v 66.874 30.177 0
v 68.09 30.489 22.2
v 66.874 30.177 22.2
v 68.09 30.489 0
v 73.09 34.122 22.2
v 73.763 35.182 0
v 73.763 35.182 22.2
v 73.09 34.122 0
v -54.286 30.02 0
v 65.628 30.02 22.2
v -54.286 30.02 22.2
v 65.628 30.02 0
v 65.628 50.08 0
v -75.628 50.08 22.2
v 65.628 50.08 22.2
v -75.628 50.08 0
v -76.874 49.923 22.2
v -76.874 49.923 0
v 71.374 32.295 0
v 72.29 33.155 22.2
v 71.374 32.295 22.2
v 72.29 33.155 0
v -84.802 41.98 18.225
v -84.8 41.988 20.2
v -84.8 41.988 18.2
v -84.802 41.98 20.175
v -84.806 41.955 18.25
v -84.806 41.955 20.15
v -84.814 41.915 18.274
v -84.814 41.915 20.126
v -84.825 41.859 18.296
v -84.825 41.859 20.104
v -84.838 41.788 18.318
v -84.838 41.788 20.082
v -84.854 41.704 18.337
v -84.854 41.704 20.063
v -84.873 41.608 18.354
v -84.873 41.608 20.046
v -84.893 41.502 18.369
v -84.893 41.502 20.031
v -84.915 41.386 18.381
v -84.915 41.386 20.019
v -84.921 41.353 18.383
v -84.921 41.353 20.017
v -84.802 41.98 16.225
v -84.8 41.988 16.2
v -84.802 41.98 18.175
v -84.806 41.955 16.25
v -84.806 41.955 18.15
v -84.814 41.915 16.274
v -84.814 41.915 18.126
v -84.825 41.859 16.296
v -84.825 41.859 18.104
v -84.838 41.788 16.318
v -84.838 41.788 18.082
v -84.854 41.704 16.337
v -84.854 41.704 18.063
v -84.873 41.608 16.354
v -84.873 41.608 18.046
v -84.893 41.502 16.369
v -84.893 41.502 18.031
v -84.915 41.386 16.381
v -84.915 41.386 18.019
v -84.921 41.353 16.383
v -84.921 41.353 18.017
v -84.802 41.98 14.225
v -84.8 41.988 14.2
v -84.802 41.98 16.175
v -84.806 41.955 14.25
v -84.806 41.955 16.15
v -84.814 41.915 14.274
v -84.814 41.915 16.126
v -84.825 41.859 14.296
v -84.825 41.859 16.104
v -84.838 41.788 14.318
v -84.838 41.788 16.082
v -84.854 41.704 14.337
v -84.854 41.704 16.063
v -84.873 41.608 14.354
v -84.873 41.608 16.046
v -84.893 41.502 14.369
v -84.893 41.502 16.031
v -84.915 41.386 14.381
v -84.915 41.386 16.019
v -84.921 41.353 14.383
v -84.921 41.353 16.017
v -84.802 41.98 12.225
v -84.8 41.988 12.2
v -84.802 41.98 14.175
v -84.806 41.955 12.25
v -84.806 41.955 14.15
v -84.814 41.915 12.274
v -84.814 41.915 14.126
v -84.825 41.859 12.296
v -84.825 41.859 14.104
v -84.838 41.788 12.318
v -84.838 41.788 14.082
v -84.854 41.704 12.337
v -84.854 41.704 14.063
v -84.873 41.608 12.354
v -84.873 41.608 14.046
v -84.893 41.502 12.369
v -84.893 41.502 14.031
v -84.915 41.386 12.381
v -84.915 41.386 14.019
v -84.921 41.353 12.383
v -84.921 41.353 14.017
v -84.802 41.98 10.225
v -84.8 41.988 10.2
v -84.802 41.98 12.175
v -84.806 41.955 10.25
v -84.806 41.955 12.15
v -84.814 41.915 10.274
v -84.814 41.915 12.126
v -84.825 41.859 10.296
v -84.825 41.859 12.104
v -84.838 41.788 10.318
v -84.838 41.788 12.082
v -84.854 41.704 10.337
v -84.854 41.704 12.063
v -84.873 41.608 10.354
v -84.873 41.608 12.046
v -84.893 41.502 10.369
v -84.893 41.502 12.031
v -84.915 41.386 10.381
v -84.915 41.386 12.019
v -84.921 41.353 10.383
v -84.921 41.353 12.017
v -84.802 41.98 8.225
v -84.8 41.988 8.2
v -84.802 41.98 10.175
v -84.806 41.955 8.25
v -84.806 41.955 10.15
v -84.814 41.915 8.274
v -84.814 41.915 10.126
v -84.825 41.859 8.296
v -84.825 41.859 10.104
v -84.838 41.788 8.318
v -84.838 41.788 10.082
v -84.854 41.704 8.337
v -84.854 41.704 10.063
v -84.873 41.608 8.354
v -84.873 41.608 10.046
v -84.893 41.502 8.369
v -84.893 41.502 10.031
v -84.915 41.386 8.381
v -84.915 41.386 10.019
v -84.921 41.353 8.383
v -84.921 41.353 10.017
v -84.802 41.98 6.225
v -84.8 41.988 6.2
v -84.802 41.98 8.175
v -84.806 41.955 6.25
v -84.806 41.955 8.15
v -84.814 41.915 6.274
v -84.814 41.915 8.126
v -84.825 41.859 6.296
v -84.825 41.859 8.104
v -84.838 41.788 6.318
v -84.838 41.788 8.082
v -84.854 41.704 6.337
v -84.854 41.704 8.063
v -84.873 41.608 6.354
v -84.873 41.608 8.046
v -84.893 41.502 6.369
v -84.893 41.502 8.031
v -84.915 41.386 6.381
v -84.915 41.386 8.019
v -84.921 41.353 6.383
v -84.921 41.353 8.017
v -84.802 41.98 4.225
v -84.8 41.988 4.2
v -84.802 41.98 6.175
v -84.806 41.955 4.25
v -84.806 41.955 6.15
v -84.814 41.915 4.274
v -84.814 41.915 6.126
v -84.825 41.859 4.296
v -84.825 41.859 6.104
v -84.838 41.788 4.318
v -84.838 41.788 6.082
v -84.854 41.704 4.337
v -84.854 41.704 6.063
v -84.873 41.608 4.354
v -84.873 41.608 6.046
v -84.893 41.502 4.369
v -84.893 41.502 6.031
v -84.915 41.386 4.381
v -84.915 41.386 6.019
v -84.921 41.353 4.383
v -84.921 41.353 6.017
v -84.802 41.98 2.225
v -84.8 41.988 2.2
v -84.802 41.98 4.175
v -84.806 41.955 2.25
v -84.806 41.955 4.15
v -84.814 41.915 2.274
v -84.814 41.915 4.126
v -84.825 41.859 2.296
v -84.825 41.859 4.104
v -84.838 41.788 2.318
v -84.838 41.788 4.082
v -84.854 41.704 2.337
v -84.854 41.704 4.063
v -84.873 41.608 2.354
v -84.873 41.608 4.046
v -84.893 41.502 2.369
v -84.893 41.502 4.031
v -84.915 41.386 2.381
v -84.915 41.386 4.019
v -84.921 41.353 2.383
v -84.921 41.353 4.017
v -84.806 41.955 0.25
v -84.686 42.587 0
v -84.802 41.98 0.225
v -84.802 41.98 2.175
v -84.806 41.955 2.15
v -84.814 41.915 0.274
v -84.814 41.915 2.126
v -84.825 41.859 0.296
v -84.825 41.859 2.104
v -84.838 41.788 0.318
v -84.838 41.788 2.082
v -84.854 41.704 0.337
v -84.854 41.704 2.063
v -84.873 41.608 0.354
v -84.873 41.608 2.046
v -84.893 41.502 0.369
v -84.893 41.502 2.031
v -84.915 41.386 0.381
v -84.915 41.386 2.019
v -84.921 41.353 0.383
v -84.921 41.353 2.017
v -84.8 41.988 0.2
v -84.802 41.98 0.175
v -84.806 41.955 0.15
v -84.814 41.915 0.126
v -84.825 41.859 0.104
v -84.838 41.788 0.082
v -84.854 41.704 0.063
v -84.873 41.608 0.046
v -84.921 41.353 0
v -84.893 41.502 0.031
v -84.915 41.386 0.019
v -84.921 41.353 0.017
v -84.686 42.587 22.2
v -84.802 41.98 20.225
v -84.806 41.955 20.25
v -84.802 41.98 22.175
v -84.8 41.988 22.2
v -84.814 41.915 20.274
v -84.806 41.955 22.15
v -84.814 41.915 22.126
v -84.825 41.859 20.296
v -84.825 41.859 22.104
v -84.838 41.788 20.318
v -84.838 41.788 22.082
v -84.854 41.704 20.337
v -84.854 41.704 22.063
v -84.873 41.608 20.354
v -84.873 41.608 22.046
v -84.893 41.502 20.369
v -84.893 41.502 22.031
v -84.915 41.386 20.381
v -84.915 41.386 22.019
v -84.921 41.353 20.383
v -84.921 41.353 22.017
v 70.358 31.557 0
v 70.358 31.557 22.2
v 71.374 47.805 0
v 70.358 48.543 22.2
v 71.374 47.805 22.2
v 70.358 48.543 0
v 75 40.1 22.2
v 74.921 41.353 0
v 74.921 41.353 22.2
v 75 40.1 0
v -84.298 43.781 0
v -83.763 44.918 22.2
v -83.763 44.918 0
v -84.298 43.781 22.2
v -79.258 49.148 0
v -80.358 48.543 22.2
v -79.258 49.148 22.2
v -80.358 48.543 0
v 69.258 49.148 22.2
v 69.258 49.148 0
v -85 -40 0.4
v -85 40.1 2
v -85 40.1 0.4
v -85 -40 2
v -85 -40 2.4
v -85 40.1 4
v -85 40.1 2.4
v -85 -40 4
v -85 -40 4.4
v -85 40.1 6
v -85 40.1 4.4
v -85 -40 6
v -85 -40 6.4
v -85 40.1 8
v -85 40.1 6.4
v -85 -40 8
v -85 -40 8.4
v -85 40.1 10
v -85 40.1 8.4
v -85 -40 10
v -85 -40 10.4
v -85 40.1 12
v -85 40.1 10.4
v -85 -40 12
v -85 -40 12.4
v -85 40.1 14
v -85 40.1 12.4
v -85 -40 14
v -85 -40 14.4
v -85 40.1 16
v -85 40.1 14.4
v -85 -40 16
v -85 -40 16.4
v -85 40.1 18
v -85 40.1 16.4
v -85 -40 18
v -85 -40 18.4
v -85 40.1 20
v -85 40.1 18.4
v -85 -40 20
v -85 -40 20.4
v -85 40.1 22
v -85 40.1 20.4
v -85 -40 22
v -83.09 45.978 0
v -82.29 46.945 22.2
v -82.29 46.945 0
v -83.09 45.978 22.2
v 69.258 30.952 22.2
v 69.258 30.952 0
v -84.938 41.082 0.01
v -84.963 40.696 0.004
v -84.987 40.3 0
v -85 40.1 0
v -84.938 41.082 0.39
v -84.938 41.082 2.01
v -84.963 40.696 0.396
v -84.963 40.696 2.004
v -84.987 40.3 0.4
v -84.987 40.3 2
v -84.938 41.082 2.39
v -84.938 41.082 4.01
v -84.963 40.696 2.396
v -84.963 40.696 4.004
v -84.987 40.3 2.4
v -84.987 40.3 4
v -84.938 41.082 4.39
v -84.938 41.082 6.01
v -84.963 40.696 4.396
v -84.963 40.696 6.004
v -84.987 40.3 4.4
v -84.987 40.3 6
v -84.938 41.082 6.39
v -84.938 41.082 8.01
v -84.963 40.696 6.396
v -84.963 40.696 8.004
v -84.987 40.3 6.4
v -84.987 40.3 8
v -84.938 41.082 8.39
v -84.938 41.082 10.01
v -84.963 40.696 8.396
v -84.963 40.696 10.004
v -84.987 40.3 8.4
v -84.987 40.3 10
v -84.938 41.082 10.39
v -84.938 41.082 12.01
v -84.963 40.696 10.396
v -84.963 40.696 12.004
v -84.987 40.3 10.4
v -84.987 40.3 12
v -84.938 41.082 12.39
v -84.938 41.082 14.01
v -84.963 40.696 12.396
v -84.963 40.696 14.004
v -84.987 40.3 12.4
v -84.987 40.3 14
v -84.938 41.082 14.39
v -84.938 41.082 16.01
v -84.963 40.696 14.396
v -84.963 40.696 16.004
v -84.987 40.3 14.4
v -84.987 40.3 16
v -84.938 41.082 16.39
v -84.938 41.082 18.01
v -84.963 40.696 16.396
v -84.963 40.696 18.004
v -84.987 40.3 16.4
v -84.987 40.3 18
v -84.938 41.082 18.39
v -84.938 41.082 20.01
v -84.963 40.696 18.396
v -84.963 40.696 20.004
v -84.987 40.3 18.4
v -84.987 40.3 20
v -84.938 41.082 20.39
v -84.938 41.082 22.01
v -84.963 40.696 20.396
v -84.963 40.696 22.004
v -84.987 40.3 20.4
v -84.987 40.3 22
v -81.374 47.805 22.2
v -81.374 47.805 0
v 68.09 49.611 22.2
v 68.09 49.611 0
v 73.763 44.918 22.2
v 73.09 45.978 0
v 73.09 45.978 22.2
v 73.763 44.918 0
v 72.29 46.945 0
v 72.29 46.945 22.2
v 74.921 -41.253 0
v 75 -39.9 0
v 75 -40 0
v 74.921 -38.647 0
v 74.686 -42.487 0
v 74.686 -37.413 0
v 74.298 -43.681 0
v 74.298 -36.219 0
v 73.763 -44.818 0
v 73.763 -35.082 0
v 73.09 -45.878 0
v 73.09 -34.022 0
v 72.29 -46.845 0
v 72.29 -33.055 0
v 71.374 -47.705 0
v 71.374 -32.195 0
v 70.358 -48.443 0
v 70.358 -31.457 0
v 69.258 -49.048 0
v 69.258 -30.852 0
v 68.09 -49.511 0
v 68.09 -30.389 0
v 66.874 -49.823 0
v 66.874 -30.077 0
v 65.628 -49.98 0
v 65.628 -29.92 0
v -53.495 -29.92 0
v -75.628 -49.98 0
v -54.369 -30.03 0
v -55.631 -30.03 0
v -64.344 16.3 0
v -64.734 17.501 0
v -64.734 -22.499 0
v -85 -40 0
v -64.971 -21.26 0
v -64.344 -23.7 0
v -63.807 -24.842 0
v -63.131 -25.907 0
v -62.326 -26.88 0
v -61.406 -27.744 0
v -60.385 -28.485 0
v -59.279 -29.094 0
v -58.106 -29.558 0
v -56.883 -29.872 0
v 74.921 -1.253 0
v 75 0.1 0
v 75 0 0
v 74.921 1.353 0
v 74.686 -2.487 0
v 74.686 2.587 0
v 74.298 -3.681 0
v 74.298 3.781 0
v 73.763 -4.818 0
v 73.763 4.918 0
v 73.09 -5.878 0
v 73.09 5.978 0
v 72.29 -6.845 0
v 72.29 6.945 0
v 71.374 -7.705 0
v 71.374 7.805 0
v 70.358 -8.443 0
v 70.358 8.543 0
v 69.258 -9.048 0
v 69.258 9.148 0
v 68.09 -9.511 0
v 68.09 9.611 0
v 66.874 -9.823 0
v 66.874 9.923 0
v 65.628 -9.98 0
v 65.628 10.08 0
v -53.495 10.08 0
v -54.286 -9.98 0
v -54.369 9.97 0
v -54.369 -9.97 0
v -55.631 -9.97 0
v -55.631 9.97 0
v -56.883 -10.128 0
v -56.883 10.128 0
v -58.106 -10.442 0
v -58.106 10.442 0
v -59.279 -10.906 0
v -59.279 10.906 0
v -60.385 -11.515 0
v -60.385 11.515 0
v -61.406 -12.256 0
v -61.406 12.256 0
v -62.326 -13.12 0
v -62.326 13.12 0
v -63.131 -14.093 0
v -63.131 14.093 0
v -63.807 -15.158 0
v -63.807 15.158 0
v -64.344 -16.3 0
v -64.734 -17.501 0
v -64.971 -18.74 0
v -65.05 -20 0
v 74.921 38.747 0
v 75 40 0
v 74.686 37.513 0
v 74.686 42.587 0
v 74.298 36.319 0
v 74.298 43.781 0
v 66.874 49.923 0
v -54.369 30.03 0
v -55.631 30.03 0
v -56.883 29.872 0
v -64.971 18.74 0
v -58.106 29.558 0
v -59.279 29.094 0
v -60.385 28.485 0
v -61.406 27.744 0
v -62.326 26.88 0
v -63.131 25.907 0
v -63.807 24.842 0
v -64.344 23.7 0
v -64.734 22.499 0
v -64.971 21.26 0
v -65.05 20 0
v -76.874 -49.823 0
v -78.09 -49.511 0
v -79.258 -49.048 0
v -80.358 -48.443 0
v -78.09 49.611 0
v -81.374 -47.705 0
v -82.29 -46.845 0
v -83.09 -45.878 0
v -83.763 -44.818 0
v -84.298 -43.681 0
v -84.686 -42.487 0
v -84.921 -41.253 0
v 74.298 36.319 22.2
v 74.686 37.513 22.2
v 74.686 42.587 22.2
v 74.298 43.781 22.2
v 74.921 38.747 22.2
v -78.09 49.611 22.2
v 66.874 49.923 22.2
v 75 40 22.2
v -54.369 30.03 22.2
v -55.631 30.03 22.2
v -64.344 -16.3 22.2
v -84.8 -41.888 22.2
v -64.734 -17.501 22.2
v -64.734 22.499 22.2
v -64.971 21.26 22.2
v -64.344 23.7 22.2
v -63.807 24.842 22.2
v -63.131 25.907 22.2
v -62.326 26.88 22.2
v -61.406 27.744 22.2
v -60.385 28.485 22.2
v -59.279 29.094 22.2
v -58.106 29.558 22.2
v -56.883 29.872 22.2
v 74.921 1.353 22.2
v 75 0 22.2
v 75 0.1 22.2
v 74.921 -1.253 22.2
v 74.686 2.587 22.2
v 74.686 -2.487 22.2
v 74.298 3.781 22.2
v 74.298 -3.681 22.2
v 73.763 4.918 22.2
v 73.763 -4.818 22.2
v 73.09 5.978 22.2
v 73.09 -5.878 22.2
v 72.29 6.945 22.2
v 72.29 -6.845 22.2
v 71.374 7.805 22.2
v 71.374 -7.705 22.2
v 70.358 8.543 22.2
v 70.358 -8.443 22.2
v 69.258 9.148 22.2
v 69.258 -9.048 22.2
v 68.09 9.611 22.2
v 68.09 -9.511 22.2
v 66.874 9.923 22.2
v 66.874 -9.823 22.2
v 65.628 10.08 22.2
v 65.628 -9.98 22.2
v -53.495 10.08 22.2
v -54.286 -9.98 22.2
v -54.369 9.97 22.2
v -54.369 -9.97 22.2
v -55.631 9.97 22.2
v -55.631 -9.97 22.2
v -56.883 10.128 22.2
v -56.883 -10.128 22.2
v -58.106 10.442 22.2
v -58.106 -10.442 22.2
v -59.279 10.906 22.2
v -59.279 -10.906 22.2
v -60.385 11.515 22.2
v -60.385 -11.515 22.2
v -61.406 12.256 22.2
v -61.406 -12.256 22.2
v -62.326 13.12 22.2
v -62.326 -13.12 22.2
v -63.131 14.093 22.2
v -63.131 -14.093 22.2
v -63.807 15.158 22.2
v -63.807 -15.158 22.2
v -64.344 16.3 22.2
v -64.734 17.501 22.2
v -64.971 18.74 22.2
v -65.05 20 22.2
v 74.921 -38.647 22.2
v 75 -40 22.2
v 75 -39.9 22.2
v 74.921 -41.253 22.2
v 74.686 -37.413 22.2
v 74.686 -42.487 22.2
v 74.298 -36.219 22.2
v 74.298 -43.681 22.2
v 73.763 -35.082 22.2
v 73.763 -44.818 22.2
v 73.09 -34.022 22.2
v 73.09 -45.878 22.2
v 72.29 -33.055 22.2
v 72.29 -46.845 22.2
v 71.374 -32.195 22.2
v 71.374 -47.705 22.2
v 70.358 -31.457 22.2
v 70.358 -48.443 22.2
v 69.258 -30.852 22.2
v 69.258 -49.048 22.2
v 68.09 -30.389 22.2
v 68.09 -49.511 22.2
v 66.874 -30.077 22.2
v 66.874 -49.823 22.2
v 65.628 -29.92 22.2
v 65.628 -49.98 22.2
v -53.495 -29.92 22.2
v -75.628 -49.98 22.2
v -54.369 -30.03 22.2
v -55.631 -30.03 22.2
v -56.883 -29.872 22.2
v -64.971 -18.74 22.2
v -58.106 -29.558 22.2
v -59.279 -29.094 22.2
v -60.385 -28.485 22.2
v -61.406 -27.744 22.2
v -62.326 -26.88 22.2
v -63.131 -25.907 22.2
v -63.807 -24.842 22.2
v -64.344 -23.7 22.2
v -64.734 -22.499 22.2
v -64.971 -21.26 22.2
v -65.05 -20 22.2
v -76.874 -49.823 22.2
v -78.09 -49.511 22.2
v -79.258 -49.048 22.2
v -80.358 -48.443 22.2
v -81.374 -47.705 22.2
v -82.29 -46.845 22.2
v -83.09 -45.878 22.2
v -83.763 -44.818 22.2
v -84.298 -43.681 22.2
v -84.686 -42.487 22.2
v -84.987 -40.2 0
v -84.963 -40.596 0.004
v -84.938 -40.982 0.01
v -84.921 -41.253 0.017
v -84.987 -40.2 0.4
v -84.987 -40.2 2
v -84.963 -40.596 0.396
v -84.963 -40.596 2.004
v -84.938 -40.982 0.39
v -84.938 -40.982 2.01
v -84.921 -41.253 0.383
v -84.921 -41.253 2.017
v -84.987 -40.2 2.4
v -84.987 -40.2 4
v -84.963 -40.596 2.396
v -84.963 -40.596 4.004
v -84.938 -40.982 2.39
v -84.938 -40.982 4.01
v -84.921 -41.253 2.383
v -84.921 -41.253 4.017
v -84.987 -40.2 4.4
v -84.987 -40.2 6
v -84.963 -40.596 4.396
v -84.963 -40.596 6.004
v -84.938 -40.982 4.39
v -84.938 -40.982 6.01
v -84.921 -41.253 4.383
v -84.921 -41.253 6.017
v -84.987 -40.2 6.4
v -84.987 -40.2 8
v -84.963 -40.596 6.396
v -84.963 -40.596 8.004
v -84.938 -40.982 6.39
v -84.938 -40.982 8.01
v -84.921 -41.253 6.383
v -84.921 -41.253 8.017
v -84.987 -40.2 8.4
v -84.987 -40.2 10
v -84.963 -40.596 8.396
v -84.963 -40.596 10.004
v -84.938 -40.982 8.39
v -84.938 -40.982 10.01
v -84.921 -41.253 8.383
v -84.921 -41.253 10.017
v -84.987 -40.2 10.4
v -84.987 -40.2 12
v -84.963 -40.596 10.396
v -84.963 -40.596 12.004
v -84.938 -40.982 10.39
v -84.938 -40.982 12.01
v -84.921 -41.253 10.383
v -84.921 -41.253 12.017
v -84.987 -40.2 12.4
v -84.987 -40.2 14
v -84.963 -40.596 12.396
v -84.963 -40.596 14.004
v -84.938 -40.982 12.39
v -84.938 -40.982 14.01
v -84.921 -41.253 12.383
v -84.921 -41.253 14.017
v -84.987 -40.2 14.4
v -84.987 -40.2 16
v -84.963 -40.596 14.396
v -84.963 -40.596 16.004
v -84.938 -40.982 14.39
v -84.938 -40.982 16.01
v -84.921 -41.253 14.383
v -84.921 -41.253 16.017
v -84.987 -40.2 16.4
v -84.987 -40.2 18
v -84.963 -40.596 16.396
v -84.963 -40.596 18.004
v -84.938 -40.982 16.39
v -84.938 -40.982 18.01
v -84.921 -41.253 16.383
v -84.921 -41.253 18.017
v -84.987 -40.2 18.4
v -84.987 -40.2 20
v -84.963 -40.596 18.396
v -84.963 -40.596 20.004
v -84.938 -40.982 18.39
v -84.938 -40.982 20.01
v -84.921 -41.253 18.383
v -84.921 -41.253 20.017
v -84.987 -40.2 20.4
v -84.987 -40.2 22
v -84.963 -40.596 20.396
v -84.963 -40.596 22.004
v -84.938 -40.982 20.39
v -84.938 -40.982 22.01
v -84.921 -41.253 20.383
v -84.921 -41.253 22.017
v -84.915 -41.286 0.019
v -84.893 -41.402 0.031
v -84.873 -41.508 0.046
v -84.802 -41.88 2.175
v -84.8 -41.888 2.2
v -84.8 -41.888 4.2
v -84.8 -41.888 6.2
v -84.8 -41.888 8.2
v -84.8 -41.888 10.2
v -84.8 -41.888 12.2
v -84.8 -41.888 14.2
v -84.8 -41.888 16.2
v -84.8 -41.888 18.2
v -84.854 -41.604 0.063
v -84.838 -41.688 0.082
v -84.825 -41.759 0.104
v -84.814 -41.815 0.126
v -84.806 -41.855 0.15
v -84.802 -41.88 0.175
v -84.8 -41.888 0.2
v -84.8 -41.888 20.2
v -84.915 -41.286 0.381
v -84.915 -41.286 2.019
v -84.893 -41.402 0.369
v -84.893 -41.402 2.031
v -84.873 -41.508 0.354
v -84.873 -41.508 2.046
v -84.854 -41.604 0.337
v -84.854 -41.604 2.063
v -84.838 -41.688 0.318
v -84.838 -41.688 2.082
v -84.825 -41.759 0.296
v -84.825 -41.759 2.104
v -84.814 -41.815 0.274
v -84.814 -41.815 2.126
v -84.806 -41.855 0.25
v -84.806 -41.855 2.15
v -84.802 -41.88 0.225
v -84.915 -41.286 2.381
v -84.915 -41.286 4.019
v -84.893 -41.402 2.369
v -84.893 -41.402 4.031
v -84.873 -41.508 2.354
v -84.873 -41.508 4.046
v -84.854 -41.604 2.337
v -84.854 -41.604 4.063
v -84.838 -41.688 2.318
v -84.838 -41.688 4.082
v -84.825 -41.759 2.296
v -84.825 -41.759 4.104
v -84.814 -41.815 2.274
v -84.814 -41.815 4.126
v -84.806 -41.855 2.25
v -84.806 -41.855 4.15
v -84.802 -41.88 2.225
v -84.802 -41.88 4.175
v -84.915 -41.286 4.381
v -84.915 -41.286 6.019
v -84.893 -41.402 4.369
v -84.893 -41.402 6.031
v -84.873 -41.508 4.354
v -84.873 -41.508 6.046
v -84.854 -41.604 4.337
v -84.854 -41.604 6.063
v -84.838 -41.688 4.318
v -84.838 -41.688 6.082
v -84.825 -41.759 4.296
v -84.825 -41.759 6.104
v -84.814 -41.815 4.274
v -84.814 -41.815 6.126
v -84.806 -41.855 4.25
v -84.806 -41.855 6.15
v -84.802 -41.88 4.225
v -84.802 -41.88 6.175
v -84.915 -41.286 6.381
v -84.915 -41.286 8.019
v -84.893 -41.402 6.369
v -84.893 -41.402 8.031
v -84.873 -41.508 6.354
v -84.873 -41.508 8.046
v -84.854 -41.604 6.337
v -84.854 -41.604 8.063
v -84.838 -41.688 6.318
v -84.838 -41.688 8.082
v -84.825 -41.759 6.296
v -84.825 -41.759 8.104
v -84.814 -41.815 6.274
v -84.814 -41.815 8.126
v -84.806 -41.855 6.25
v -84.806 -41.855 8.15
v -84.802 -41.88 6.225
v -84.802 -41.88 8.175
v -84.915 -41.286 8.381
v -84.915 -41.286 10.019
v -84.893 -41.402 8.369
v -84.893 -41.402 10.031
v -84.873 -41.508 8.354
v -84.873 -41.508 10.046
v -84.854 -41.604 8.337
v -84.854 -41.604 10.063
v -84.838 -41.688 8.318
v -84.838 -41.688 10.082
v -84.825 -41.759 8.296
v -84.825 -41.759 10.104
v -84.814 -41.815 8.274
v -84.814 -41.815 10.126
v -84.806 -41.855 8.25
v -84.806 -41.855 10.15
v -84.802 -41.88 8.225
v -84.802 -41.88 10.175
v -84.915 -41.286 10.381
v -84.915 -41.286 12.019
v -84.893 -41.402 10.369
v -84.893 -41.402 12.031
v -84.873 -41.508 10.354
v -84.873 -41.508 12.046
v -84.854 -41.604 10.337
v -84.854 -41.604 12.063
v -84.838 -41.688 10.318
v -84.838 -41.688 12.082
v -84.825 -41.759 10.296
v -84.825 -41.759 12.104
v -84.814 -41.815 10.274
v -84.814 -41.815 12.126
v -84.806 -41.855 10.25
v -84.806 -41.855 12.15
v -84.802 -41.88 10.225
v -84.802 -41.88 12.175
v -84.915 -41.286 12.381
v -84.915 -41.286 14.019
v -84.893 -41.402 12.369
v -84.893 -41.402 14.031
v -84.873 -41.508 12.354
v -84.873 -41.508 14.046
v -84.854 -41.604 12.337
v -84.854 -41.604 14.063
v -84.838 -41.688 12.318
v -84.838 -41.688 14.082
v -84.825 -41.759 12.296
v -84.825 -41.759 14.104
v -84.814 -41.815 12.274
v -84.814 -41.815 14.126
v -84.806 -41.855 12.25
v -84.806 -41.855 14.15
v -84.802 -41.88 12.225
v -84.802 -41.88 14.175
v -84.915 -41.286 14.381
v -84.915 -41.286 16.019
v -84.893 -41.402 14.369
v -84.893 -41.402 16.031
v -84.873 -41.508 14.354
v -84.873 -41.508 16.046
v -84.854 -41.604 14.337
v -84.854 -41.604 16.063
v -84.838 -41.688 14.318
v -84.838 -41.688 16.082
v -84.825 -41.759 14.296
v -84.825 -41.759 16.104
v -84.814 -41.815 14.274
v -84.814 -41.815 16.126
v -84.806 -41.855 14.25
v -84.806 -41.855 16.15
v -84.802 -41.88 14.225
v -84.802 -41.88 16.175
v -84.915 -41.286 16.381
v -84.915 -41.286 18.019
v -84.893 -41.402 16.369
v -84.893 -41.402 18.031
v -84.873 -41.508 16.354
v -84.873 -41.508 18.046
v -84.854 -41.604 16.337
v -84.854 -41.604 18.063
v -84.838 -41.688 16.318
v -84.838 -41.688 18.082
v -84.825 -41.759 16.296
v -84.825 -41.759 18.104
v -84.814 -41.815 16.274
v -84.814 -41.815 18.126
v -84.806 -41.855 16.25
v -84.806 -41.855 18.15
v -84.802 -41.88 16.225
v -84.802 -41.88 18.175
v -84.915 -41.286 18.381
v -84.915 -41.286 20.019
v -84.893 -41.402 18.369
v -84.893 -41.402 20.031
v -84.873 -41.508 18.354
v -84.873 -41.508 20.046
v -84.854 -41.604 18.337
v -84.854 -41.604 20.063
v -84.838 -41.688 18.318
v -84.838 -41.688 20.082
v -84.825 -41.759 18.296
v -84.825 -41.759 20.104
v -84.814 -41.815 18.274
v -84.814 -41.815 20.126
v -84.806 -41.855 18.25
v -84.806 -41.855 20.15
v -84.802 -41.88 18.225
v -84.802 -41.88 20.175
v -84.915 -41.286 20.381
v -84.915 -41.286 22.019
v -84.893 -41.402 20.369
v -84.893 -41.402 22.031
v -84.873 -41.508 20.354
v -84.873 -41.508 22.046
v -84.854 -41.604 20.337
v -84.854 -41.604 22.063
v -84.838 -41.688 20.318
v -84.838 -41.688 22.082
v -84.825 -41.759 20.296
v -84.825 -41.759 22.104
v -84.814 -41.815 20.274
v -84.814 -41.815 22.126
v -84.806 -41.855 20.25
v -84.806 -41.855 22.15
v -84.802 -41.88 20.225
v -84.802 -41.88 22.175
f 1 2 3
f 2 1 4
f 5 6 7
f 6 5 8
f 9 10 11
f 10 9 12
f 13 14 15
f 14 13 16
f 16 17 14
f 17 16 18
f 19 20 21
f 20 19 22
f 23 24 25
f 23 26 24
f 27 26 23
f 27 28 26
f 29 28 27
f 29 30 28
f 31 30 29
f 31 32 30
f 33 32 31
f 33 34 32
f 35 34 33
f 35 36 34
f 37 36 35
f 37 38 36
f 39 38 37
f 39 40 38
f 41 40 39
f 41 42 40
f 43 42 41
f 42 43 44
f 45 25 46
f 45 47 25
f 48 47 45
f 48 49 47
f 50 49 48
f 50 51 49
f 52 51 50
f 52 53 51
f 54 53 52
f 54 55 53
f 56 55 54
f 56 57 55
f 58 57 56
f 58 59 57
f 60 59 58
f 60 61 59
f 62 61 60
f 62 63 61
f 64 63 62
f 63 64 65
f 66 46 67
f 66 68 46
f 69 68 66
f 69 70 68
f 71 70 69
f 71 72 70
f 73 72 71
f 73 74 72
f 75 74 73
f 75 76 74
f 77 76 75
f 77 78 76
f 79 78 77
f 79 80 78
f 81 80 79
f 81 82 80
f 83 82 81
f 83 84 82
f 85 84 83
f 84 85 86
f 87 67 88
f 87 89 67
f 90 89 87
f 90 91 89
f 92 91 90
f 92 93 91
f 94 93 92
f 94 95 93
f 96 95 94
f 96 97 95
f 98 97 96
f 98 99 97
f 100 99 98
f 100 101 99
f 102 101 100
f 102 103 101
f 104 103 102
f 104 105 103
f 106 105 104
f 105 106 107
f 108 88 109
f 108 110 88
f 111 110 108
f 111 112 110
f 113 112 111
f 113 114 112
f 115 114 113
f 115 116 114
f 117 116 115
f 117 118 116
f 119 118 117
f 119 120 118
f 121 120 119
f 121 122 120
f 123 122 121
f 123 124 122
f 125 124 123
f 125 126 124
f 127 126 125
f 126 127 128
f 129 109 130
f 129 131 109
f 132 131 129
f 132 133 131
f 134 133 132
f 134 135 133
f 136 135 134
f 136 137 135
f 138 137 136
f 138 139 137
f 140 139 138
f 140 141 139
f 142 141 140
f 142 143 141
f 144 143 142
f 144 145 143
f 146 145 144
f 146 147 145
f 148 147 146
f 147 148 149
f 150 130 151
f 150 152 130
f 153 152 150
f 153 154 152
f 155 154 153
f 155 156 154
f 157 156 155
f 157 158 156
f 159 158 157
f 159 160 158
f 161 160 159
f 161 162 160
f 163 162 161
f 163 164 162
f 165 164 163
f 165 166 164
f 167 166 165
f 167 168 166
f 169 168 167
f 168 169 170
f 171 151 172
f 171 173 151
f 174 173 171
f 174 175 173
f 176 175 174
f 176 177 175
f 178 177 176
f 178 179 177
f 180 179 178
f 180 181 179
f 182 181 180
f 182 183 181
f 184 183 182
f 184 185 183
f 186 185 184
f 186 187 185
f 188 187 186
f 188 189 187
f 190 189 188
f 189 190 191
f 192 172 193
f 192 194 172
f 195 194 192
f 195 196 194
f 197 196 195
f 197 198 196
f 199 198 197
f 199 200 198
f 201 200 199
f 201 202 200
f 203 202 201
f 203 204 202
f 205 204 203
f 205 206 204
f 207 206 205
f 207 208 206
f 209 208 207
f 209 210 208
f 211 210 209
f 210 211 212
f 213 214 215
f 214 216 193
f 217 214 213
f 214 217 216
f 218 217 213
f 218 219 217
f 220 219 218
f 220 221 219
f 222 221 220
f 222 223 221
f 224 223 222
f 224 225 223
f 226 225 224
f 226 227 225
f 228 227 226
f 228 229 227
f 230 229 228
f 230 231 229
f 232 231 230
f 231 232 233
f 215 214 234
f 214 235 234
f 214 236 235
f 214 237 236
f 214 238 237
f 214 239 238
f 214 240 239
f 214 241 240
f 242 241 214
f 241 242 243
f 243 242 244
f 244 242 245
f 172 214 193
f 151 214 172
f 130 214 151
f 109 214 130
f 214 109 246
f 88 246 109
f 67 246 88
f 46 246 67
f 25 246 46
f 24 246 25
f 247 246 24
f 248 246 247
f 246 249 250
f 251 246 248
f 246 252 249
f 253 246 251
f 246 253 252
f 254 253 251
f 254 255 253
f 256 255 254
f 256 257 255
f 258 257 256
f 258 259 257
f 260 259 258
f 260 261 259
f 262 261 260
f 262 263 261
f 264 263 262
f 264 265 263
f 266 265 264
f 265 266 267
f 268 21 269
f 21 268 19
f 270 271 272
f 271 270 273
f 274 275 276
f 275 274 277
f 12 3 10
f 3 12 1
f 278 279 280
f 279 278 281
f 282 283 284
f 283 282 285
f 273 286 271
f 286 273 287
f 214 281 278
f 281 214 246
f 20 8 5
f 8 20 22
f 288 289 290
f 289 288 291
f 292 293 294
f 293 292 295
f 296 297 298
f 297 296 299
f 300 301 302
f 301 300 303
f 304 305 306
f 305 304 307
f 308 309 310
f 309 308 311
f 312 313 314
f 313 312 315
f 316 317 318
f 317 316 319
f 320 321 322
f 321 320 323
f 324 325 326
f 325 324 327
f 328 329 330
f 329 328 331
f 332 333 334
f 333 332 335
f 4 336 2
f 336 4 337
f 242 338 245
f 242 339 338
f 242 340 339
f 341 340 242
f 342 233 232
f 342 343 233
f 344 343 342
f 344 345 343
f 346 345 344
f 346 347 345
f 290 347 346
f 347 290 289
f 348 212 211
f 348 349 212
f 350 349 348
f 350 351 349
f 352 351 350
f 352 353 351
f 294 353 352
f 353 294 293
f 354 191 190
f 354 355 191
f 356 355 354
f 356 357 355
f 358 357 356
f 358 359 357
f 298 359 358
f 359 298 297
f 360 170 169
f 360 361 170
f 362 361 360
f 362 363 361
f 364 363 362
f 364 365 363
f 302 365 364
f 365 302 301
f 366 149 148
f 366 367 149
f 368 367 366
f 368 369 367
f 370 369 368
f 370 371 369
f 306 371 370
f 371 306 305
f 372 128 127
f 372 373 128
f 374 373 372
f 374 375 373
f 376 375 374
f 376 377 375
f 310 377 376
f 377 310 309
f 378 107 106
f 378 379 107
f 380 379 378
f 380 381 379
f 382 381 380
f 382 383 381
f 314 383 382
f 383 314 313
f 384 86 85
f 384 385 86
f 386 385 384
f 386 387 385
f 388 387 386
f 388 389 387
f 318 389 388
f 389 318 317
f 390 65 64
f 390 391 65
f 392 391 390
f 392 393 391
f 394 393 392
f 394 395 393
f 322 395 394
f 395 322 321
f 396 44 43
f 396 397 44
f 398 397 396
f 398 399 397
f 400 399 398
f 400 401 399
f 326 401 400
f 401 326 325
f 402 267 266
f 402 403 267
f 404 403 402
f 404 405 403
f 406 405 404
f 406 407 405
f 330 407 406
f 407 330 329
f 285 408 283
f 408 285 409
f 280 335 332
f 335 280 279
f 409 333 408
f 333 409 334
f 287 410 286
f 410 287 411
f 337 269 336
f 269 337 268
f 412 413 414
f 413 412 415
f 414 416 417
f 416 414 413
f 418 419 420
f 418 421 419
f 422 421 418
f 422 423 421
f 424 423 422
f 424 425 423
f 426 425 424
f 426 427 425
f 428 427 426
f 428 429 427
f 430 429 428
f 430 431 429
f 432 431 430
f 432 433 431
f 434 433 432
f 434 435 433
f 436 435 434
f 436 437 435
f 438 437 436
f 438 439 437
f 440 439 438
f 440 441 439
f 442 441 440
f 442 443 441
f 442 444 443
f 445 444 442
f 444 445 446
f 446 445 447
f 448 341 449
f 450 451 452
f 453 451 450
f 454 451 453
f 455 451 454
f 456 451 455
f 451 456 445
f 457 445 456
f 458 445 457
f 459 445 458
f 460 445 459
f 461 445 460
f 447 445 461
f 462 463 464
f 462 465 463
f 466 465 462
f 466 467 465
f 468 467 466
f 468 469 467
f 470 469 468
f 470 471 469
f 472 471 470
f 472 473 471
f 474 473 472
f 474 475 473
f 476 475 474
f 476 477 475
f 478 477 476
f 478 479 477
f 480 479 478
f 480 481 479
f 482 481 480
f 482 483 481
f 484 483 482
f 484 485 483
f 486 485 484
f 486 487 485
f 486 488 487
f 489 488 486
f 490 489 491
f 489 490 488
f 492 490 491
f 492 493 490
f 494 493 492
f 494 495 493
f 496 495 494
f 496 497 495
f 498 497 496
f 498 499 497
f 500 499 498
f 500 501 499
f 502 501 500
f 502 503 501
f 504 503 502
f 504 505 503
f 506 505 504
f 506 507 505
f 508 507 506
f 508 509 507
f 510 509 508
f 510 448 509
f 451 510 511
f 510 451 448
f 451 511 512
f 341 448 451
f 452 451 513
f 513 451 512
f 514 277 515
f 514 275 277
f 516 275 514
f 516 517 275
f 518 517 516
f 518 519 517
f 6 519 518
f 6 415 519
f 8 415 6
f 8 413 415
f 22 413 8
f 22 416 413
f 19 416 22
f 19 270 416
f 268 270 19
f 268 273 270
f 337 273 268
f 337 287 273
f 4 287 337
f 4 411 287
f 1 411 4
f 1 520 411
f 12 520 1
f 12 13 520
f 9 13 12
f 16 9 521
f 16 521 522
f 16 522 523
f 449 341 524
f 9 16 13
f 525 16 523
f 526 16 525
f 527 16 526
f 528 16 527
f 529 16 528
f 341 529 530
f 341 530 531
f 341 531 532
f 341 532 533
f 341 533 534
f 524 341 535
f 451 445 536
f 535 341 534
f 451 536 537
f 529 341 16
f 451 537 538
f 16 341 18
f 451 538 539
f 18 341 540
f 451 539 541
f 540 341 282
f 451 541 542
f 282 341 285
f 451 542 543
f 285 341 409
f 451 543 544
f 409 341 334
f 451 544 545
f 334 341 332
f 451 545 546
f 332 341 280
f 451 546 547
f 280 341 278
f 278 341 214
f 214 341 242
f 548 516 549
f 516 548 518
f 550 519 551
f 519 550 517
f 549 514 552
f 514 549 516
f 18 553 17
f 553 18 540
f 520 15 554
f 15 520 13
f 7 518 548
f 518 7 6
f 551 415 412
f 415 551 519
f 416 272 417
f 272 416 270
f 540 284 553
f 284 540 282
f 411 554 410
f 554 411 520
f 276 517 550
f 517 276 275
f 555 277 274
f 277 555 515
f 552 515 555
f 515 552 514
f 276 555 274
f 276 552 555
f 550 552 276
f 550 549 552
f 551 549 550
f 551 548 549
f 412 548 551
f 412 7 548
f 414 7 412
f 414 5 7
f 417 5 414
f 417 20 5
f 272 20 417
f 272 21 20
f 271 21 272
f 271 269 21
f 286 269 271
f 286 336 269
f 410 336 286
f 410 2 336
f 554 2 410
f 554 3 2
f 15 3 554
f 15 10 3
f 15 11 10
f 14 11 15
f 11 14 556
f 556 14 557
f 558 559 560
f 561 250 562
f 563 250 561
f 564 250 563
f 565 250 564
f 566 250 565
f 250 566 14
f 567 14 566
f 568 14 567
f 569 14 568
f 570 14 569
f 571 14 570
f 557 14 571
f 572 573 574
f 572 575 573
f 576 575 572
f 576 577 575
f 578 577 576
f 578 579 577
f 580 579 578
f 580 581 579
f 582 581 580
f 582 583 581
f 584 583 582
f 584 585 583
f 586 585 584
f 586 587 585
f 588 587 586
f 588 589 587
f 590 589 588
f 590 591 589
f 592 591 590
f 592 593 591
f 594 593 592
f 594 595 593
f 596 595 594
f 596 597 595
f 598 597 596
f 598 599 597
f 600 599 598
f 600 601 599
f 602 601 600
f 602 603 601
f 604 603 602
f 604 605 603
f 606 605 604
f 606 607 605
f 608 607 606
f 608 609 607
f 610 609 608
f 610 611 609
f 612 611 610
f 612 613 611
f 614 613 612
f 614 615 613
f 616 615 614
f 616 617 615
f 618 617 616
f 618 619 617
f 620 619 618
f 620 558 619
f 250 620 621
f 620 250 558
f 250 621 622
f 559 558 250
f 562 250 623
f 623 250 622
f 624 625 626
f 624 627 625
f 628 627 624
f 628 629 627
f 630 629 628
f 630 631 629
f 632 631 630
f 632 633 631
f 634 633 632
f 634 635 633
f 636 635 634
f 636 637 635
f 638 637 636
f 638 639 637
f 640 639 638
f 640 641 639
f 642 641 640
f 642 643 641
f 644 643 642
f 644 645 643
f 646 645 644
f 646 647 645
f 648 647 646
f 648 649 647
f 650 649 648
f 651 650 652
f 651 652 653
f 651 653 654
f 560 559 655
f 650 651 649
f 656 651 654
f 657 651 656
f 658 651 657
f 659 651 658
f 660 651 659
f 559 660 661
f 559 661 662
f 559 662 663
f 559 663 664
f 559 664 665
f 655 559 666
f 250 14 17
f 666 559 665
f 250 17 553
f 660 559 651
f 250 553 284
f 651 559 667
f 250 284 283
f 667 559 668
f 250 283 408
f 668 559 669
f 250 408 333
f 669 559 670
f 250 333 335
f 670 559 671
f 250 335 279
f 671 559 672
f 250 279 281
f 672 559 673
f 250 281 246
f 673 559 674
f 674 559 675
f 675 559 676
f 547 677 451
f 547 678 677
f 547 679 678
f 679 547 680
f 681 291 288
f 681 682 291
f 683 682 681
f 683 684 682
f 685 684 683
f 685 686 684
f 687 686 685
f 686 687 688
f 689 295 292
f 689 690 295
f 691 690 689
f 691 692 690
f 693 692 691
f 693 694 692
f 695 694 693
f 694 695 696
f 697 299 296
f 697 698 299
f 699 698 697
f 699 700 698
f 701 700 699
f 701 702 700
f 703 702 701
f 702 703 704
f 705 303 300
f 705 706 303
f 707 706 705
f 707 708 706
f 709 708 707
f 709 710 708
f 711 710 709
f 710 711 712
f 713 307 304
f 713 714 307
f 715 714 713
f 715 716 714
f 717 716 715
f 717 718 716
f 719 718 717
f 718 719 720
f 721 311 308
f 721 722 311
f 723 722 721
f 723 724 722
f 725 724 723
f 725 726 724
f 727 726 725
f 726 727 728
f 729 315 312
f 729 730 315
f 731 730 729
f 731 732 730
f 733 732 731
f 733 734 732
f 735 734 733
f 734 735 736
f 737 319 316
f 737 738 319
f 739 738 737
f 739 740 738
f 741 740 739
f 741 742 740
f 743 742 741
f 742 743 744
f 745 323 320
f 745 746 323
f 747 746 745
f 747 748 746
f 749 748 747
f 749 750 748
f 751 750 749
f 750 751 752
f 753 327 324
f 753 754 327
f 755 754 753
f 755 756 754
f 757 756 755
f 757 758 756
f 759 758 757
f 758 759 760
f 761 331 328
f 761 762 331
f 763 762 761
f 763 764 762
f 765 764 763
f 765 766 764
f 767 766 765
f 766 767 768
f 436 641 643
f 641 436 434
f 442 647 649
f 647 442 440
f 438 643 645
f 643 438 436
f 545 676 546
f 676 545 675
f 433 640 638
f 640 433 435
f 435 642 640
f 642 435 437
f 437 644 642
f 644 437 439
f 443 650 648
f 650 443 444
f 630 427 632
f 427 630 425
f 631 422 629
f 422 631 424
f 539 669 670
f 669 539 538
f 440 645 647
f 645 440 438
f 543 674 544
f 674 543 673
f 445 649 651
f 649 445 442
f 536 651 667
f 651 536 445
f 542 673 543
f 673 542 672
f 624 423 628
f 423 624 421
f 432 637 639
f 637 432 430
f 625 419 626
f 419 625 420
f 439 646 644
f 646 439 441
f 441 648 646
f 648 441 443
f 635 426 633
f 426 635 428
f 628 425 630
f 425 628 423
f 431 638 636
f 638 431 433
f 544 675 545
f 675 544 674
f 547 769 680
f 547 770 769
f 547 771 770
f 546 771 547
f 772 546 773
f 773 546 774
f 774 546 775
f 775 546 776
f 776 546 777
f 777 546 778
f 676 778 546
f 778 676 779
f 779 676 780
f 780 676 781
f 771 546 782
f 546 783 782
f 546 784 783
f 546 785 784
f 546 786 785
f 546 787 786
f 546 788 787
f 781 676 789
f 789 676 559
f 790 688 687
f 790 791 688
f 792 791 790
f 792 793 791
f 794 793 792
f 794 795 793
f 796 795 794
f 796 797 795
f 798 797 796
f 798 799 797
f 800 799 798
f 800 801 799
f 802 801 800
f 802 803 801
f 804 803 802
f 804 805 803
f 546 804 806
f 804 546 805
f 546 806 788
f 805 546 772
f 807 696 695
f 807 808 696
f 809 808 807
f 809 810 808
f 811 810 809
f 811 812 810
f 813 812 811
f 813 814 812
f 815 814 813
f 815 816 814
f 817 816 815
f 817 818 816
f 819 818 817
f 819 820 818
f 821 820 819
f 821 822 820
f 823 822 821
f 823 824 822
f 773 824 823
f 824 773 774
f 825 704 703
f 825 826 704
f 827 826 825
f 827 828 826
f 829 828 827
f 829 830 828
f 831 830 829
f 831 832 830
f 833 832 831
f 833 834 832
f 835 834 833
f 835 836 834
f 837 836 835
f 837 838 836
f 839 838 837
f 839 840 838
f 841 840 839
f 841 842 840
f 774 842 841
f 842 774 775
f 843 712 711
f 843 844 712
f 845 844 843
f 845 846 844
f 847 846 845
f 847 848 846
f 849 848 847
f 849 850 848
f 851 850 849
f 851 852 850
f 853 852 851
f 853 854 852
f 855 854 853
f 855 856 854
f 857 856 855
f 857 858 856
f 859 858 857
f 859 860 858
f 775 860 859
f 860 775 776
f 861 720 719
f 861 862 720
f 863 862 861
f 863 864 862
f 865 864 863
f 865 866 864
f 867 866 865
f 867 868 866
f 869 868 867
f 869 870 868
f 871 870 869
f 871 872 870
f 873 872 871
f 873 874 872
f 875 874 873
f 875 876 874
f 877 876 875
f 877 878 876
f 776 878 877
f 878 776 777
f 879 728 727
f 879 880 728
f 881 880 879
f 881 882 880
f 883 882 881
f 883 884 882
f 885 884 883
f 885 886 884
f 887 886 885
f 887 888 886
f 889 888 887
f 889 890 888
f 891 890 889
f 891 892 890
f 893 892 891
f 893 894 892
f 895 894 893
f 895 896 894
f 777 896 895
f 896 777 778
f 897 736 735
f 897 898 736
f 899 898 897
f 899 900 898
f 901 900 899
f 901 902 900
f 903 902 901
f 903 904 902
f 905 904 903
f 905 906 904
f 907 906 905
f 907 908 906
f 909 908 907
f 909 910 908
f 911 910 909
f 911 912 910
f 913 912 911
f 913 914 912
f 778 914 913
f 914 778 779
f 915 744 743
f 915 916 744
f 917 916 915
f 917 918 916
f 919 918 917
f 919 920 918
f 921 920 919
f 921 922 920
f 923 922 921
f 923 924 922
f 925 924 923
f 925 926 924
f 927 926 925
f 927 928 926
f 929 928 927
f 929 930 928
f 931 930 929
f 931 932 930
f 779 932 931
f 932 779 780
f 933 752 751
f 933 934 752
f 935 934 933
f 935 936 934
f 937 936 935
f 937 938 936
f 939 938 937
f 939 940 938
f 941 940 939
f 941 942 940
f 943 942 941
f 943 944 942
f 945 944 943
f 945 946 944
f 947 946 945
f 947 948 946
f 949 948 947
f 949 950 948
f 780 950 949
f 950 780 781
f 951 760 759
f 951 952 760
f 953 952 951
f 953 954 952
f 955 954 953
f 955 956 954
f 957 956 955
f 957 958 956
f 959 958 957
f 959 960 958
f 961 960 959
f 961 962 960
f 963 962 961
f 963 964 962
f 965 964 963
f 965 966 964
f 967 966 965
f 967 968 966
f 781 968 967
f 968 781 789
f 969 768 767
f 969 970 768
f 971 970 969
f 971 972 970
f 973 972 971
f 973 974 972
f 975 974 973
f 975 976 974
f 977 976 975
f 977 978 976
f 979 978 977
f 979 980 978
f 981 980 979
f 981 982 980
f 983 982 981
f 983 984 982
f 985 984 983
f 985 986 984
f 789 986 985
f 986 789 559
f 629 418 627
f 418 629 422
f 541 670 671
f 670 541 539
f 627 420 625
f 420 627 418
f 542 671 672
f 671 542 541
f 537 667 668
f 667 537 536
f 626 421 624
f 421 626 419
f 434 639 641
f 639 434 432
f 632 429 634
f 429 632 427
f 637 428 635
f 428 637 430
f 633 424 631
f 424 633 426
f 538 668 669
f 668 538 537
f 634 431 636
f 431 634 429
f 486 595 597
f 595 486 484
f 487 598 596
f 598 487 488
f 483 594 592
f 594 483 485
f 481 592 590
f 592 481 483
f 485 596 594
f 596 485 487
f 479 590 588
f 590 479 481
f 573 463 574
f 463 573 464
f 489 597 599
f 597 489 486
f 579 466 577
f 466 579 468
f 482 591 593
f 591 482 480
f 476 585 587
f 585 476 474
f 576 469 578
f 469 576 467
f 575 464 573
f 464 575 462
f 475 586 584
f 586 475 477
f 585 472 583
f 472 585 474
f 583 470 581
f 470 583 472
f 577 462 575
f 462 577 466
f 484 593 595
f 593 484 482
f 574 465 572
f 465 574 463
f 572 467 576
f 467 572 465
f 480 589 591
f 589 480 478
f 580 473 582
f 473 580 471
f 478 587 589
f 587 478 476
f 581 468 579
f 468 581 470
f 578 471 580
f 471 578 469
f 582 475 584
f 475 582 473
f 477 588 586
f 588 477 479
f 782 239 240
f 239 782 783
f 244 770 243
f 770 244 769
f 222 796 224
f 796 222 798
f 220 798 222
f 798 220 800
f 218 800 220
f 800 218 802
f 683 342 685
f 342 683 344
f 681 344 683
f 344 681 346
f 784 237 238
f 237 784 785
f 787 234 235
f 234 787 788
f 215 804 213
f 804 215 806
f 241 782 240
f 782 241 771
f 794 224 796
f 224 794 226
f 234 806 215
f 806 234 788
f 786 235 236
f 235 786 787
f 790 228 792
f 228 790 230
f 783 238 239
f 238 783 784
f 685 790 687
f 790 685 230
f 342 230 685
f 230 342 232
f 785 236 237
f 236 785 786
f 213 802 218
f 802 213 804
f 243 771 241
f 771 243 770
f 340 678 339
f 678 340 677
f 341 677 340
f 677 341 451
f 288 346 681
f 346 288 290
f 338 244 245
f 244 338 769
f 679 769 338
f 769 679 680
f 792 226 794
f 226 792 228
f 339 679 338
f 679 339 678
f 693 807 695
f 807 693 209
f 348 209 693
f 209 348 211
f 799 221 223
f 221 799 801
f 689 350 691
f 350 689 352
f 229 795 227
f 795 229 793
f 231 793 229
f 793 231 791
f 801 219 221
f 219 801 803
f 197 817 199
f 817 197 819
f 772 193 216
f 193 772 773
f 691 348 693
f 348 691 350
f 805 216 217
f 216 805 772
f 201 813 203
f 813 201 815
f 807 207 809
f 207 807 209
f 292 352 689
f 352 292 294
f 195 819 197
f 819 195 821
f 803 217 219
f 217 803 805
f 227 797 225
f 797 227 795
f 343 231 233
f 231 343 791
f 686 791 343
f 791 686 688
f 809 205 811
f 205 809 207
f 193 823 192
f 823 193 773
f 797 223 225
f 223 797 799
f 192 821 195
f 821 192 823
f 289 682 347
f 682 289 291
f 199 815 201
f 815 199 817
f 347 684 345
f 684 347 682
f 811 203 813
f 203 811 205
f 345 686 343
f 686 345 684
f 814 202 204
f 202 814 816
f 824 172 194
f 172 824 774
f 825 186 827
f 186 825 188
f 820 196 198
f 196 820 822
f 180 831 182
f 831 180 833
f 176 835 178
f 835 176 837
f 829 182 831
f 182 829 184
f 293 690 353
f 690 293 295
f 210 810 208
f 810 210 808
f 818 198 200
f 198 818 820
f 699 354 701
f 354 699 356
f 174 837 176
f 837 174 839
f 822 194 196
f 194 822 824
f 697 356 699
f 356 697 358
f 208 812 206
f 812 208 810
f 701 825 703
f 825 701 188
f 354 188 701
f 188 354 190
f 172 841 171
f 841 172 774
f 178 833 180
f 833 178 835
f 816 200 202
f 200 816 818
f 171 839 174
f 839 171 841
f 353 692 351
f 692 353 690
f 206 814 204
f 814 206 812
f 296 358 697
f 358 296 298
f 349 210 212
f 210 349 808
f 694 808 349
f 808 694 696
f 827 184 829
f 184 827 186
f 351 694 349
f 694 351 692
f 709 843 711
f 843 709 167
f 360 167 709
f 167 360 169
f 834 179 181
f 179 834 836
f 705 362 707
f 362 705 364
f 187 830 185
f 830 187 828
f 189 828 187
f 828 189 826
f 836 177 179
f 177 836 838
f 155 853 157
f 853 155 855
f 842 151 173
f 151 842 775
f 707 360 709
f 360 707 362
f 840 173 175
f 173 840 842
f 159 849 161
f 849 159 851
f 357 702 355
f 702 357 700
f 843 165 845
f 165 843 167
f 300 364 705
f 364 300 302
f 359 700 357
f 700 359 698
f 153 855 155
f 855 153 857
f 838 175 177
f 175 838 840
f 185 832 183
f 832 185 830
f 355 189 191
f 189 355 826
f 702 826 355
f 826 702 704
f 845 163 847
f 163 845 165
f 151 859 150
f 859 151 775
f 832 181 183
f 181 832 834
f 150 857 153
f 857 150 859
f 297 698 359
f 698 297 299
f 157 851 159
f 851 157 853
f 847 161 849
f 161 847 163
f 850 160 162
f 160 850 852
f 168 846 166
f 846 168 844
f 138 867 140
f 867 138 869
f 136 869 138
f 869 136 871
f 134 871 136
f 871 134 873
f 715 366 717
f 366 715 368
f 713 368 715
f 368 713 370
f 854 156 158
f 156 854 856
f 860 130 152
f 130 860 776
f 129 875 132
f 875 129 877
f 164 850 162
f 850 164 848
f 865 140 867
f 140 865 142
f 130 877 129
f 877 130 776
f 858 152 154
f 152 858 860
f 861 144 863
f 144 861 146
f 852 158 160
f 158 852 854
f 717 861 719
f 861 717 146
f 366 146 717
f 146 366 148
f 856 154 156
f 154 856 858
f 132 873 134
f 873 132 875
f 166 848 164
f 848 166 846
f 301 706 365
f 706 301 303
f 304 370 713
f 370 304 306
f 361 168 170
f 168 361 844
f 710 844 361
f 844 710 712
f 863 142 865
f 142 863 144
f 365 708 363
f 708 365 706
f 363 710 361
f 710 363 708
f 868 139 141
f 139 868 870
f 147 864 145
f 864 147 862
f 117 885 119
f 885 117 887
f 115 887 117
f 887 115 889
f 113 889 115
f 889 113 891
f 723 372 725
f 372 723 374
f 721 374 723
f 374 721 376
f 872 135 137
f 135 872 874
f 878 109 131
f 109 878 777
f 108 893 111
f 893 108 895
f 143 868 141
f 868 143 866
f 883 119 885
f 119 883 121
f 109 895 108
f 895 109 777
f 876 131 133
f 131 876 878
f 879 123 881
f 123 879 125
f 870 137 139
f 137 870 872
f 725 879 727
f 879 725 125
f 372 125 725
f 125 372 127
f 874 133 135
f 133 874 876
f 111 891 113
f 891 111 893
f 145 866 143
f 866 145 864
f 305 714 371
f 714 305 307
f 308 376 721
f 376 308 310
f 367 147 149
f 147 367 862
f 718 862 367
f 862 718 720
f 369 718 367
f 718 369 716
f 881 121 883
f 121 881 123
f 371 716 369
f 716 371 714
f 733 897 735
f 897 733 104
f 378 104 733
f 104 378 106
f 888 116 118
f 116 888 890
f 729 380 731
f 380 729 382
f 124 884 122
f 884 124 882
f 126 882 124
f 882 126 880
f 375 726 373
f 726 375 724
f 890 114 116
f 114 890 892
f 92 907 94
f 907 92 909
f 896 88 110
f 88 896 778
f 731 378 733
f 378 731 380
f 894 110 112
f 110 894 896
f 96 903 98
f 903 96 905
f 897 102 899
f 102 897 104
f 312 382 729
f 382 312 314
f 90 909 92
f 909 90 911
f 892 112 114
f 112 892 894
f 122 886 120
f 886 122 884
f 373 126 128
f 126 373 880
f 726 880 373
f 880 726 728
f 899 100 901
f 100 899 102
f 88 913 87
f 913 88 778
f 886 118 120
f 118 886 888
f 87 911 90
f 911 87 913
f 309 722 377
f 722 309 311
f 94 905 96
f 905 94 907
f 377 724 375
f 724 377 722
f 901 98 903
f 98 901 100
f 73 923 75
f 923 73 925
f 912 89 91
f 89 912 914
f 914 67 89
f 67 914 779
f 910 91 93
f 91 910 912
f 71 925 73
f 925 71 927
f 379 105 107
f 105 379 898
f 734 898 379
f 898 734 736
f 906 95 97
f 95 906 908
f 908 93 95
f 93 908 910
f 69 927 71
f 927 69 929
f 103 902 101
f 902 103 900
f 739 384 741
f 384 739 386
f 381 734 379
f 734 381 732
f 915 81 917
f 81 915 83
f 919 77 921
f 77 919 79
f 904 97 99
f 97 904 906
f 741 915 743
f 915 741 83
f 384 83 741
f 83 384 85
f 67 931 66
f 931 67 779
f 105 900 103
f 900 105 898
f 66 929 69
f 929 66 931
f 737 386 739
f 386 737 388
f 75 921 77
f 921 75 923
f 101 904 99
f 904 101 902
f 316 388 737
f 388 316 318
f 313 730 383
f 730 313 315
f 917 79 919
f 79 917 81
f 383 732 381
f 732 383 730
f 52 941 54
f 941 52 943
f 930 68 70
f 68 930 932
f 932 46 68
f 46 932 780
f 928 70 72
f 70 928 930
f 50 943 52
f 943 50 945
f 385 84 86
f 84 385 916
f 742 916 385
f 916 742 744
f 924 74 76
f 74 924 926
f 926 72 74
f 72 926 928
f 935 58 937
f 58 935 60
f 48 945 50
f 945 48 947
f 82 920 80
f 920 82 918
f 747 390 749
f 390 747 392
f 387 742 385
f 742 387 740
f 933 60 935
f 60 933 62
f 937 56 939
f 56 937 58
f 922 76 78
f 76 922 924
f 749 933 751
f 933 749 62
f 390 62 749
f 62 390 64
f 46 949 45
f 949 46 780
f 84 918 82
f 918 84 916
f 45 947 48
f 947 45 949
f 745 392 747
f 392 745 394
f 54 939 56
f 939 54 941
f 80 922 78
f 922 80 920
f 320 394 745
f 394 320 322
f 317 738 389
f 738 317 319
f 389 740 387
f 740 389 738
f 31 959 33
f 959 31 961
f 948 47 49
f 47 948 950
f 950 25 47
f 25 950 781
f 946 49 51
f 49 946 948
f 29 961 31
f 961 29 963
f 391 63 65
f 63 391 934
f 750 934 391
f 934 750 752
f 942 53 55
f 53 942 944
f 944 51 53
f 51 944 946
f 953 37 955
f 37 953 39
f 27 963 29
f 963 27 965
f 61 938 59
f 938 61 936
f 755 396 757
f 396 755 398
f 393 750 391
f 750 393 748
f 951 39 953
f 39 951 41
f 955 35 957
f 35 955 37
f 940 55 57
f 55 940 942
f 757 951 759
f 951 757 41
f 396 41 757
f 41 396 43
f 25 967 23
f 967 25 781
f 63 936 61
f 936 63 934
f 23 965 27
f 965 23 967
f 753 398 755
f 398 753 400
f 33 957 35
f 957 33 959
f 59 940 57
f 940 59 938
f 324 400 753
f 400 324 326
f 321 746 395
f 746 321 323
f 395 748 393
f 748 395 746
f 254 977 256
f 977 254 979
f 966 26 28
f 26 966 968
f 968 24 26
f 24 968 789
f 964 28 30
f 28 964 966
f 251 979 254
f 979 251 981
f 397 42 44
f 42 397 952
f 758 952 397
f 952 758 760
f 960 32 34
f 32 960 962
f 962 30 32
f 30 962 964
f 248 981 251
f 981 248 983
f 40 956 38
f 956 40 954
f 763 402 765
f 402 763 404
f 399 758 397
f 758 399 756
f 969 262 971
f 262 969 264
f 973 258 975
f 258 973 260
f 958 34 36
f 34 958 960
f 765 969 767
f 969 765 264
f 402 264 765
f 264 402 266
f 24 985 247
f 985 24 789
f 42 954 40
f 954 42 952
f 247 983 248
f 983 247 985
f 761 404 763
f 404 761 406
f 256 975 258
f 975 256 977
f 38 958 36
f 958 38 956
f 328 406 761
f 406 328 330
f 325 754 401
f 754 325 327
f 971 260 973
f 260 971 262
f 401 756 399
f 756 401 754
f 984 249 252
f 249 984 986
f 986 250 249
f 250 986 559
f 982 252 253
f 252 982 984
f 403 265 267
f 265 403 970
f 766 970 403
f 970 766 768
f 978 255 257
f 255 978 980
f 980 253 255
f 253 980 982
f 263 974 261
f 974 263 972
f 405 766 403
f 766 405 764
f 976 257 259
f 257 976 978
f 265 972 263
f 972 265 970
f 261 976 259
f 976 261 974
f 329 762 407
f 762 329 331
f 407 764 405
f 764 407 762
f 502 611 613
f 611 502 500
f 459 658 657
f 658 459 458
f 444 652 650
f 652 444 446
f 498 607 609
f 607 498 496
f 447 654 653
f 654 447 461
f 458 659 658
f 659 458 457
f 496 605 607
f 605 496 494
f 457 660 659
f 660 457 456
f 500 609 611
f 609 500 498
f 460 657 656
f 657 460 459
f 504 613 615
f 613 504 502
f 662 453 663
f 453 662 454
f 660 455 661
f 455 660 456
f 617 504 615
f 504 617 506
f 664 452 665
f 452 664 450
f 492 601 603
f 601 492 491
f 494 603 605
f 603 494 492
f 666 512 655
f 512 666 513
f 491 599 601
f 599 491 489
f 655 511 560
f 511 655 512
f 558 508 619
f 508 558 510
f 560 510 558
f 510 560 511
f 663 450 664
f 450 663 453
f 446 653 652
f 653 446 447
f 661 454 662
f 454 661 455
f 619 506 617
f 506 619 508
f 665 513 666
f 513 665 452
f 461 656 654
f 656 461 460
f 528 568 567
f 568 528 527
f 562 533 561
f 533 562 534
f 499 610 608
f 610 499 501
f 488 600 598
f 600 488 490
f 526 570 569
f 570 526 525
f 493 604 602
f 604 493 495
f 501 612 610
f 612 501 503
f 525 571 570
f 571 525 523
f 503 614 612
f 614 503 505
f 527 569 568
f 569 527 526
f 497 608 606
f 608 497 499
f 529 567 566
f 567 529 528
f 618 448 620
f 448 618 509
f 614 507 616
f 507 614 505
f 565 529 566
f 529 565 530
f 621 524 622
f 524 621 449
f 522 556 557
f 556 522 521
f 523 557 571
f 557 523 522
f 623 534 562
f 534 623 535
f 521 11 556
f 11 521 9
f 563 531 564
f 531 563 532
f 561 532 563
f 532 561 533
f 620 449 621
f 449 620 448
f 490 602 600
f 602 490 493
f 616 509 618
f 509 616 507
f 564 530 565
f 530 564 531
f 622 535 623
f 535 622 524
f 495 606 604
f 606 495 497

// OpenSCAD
//-------------------------------------------------------------------------------------------
// Max Flow Test
// Original Design : Cnc Kitchen
//                   https://www.printables.com/fr/model/342075-extrusion-test-structure
// Freely adapted by 5@xes  2023
//---------------------------
//     MaxFlow Script
//---------------------------
// Nozzle               : 0.4
// Layer                : 0.25
// Start Value          : 50 %
// Value Increment      : 10 %
// Change Layer         : 8 
// Offset Layer         : 0
//-------------------------------------------------------------------------------------------
// Modification : None
//-------------------------------------------------------------------------------------------

$fn=50;
font = "Arial:style=Bold";

Hc=0.2; // Layer Height
Line_Width = 0.4; // line Width

Height = 110*Hc-1;
letter_size = 0.30*Height;
letter_height = Line_Width;

Base();


module Base() {
  translate([-75, -40, 0]) difference() {  
    minkowski() {
        union() {
            translate([0, 0, 0]) cube([10,80,Height+Hc], center = false);
            translate([0, 0, 0]) cube([140,0.1,Height+Hc], center = false);
            translate([0, 40, 0]) cube([140,0.1,Height+Hc], center = false);
            translate([0, 80, 0]) cube([140,0.1,Height+Hc], center = false);
        }
      cylinder(r=10,h=1, center = false);
    }
    translate([20, 20, 0]) cylinder(h = Height*2, r1 = 10.05, r2 = 10.05, center = false);
    translate([20, 60, 0]) cylinder(h = Height*2, r1 = 10.05, r2 = 10.05, center = false);
    
    for (a =[0:2:30])
        translate([-10, -10, a+Hc]) rotate([-90,0,0]) cylinder(h = 150, r1 = 0.2, r2 = 0.2, center = false);
  }
}

module letter(Txt) {
  color("Yellow")
  linear_extrude(height = letter_height) {
    text(Txt, size = letter_size, font = font, halign = "center", valign = "center");
  }
}
